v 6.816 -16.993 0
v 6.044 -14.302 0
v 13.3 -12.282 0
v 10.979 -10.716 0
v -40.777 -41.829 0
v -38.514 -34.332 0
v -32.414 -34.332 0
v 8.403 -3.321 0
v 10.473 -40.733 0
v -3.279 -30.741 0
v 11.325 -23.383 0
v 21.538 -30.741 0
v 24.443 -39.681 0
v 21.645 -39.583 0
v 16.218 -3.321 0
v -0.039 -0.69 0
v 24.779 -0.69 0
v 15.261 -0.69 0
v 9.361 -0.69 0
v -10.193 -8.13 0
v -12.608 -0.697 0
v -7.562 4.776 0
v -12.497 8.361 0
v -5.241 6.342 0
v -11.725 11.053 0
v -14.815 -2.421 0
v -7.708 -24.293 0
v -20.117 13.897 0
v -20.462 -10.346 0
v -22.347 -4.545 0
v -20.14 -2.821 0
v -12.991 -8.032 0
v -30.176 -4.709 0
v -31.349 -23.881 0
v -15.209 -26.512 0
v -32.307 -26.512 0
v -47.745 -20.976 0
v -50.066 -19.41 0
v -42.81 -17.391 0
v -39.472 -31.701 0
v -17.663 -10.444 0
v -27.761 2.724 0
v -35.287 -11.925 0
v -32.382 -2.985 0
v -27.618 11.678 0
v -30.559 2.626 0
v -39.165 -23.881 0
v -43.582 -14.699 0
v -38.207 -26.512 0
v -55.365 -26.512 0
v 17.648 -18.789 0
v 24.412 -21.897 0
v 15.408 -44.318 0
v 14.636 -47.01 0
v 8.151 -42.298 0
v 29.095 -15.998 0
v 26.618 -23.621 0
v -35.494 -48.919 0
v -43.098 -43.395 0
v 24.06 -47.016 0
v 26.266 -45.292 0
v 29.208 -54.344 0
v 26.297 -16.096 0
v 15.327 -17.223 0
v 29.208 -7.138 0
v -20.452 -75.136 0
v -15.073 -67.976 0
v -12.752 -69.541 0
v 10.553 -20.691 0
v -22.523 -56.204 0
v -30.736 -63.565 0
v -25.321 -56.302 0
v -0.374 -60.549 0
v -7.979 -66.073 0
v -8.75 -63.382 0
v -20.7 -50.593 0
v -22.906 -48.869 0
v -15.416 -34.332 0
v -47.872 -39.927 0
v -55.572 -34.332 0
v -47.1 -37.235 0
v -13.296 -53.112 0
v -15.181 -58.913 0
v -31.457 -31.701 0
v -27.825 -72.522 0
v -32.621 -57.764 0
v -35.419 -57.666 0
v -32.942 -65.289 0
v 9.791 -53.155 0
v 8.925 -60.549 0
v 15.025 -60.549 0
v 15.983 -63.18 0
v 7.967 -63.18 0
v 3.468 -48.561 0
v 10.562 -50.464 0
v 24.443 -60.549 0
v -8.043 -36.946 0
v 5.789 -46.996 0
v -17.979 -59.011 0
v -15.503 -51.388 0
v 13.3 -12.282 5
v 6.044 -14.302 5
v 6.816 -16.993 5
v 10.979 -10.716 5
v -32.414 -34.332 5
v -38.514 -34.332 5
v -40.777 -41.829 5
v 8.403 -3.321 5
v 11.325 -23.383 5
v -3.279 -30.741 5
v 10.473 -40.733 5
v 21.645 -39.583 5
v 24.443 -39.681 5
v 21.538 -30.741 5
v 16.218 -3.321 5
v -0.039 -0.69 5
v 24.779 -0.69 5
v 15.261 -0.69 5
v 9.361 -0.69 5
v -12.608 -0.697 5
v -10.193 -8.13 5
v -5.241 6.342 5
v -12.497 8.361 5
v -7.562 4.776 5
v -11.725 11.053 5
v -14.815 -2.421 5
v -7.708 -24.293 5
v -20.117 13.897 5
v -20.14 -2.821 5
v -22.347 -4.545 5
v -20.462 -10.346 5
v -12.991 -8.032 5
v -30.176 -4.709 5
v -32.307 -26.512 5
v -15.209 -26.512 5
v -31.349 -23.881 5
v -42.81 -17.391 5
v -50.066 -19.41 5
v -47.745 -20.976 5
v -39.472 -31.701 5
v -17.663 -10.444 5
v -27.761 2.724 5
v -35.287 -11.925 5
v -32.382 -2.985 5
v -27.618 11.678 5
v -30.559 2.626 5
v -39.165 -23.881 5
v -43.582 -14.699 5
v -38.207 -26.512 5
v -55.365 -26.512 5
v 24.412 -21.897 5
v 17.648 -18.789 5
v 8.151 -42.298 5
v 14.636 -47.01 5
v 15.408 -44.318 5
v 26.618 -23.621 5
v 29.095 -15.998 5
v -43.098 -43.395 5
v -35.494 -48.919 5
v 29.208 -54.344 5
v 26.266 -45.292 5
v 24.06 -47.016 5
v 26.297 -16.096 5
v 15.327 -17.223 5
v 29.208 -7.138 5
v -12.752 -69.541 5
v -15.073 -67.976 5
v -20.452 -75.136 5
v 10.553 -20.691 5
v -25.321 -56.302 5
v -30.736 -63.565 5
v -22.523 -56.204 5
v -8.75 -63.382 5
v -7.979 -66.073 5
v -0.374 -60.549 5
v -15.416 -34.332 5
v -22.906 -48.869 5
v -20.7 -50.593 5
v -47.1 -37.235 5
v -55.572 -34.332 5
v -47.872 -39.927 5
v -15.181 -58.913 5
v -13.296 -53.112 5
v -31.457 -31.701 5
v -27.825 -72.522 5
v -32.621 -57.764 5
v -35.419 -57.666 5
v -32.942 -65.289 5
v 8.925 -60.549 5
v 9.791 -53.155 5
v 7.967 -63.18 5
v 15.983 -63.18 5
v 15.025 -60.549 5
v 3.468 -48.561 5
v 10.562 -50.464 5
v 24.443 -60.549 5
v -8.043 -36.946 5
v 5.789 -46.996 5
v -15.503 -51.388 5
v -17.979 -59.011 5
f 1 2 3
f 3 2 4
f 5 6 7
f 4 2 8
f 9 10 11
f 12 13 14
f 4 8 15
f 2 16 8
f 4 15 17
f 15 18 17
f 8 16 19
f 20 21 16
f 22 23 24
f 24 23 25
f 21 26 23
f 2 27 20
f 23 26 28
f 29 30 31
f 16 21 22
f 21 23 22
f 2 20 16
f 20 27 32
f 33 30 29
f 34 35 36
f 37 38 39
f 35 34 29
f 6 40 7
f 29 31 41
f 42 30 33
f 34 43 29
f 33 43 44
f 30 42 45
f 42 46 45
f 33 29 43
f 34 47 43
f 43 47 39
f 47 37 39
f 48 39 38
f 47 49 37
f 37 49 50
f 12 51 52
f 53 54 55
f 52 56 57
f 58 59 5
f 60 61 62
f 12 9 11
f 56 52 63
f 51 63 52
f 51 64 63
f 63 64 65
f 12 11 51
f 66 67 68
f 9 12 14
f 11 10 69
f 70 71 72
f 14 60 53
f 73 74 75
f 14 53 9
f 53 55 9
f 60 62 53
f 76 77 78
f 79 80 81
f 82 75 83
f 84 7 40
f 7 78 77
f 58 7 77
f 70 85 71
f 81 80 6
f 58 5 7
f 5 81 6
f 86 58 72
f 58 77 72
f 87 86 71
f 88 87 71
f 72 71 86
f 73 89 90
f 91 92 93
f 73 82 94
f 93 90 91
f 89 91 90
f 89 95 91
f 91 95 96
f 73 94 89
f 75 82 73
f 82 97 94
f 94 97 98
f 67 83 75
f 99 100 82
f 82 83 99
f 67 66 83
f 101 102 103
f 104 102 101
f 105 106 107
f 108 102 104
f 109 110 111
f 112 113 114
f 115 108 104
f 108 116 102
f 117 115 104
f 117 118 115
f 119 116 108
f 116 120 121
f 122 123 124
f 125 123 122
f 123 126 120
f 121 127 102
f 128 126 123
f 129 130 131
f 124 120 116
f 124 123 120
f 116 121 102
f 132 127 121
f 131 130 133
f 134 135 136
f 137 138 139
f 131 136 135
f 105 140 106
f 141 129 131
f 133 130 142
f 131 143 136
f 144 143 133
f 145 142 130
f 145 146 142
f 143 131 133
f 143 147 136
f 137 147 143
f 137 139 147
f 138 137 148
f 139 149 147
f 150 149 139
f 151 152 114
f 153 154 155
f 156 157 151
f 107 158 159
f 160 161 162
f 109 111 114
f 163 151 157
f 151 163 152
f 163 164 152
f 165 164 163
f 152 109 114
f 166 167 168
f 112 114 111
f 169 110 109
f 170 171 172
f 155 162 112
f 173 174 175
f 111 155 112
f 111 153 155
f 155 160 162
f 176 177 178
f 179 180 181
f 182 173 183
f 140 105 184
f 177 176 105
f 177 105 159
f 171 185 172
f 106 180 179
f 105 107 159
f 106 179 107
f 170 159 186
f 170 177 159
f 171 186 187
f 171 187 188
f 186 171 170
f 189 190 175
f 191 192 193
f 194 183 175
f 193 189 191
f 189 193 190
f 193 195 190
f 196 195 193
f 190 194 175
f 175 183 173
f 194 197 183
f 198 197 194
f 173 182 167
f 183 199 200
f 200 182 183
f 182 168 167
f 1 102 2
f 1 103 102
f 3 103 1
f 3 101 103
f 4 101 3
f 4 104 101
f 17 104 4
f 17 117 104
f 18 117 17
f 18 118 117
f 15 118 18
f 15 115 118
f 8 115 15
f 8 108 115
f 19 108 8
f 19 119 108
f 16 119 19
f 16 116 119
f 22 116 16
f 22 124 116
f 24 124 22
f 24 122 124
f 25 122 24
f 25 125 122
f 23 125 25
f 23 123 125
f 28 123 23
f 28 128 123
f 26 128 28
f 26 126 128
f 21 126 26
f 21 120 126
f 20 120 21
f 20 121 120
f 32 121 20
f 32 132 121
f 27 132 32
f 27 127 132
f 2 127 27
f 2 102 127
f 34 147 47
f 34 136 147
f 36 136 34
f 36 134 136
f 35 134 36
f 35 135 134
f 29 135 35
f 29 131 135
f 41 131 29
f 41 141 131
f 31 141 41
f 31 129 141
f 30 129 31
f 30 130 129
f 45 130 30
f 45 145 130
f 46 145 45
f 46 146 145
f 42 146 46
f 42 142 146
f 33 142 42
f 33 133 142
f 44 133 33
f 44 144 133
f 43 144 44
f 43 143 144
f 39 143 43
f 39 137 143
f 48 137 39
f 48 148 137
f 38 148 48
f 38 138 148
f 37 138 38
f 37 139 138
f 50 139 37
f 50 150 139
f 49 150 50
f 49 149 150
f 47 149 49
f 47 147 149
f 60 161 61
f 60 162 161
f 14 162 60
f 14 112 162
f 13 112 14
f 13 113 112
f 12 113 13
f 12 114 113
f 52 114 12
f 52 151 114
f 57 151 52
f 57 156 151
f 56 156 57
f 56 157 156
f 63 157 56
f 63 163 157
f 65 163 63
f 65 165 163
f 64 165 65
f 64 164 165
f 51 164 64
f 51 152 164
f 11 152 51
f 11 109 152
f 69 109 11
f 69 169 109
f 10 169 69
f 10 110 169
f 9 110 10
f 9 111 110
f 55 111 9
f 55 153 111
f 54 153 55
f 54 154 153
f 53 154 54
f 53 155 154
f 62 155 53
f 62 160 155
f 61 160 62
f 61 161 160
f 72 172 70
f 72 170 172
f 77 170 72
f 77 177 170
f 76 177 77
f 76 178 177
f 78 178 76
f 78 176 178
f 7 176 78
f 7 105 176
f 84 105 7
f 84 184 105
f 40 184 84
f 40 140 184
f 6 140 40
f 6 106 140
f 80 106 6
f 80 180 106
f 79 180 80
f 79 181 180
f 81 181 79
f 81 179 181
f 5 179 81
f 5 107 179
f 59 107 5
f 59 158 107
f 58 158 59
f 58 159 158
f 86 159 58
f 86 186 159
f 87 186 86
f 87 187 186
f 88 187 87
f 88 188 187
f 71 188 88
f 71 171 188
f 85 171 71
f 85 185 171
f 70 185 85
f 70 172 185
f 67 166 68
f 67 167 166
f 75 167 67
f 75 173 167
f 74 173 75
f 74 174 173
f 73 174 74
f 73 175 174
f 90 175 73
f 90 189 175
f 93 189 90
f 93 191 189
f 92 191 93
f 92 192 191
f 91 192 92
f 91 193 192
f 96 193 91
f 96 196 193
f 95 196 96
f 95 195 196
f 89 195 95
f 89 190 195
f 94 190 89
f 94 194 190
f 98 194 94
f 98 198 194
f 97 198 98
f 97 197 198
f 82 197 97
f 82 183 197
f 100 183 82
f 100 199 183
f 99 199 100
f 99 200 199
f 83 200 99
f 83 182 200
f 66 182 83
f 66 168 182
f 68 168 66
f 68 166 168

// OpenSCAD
/* construct Penrose tiling 
  Choose which vertex figure to print
  
   Kit Wallace 2019-03-19
   
*/
// length of the long side of the kite and dart
side = 40;  
// tile inset -ve for outset for laser cutting +ve for 
inset=-0.035;

//  vertex figure 0 to 6 , 7 kite only ,8 dart only
fig=0;
//tab angle
tab_angle=110;
//tab_depth - based on a unit side
tab_depth = 0.07;
//tab_width - based on a unit side
tab_width = 0.15;

// ratio to explore for layout
explode=0.3;
// height for extrusion (0 no extrusion
height=5;


// end of parameters

r1= 2 * cos(72);
p_kite = scale_peri([[r1,144],[r1,72],[1,72],[1,72]],side);
t_kite=peri_to_tile(p_kite);
p_dart = scale_peri([[r1,216],[r1,36],[1,72],[1,36]],side);
t_dart=peri_to_tile(p_dart);
   
function tab(step,parity,a,l,td) =
     let (d=(step[0]-l)/2)
     let (dl=l+td*2*cos(180-a))
     parity ==0 
         ? [[d,180+a],[td,180-a],[dl,180-a],[td,180+a],[d,step[1]]] 
         : [[d,180-a],[td,180+a],[dl,180+a],[td,180-a],[d,step[1]]] ;

function tab_peri(peri,start,a=110,l,td) =
   flatten([for(i=[0:len(peri)-1])
       let(p=peri[i])
       tab(p,(start+i)%2,a,l,td)
    ]);
  

_tab_width=side *tab_width;
_tab_depth=side *tab_depth;

p_tab_kite = tab_peri(p_kite,0,tab_angle,_tab_width,_tab_depth);
t_tab_kite=  peri_to_tile(p_tab_kite);
p_tab_dart=  tab_peri(p_dart,1,tab_angle,_tab_width,_tab_depth);
t_tab_dart=  peri_to_tile(p_tab_dart);
//scale(20) { color("red") fill_tile(t_dart); number_edges(t_dart); translate([1.5,0,0])  { color("green") fill_tile(t_kite);number_edges(t_kite);}}  

colors= ["red","green","blue","pink","yellow","orange"];
tiles= [t_kite,t_dart];
tab_tiles= [t_tab_kite,t_tab_dart];
   
k=0;d=1;

pairings = 
    [[[k,2],[k,3]],[[k,0],[k,1]],[[d,2],[d,3]],[[k,0],[d,0]],[[k,1],[d,1]],[[k,2],[d,2]],[[k,3],[d,3]]];

//should be able to compute these allowable assemblies of tiles given the pairings but not yet done
assemblies = [
    [[[d,0]],[[d,2],[0,3]],[[d,2],[1,3]],[[d,2],[2,3]],[[d,2],[3,3]]],
    [[[k,0]],[[k,2],[0,3]],[[d,0],[0,0]]],
    [[[k,0]],[[k,2],[0,3]],[[k,2],[1,3]],[[k,2],[2,3]],[[k,2],[3,3]]],
    [[[d,0]],[[d,2],[0,3]],[[d,2],[1,3]],[[k,3],[2,3]],[[k,2],[0,2]]],
    [[[k,0]],[[k,1],[0,0]],[[d,0],[1,0]],[[d,1],[0,1]]],
    [[[k,0]],[[k,1],[0,0]],[[d,2],[1,2]],[[k,3],[2,3]],[[k,2],[0,3]]],
    [[[k,0]],[[d,1],[0,1]],[[k,2],[1,2]],[[k,2],[2,3]],[[d,0],[0,0]]],
    [[[k,0]]],
    [[[d,0]]]
   
];

b_transforms = group_transforms(tiles,assemblies[fig]);
// u_base = apply_group_transforms(tiles,b_transforms);
u_tab = apply_group_transforms(tab_tiles,b_transforms);
if (height>0)
    linear_extrude(height=height)
      fill_tiles(explode_tiles(inset_group(u_tab,inset),explode),colors);
else 
       fill_tiles(explode_tiles(inset_group(u_tab,inset),explode),colors);

// extracts from tiling library
module fill_tiles (tiles,colors=["lightgreen"]) {
    for (i=[0:len(tiles)-1]) {
       colors = colors[i % len(colors)];
       fill_tile(tiles[i],colors); 
    }
}
module fill_tile(tile,col="red") {
    color(col)
       polygon(3d_to_2d(tile)); 
};
 // functions

function explode_tiles(tiles,factor) =
   [for (t=tiles)  
     let (c = v_centre(t))
     let (d = c*factor)
     translate_tile(t,d)
   ]
  ;

function inset_group(g,d)=
   [for (t=g)  inset_tile(t,d)];
  
// create list of transformations 
// apply the transformations

function group_transforms(tiles,assembly,group=[],transforms=[],i=0) =
    i==len(assembly)
        ? transforms
        : let(move = assembly[i])
          let(source = move[0])
          let(source_i=source[0])
          let(source_side=len(source)==2 ? source[1] :0)
          let(mirror = len(source)==3 ? 1 : 0)
          let(source_tile = mirror==1 ? mirror_tile(tiles[source_i]) : tiles[source_i] )
          len(move) ==1
             ? let (m = m_edge_to_edge(edge(source_tile,0),edge(source_tile,source_side)))
               let (nt = copy_tile(source_tile,m))
               let (t= [source_i,m,mirror])            
               group_transforms(tiles,assembly,concat(group,[nt]),concat(transforms,[t]),i+1)
             : let (dest = move[1])
               let (dest_i=dest[0])
               let (dest_tile=group[dest_i])
               let (dest_side=dest[1])
               let (end = len(dest)==3 ? 1 : 0)
               let (m = m_edge_to_edge(edge(source_tile,source_side),edge(dest_tile,dest_side,end)))
               let (nt = copy_tile(source_tile,m))
               let (t= [source_i,m,mirror])
               group_transforms(tiles,assembly,concat(group,[nt]),concat(transforms,[t]),i+1);

function apply_group_transforms(tiles,transforms,group=[],i=0) =
     i==len(transforms)
        ? group
        : let (transform = transforms[i])
          let (source_tile=tiles[transform[0]])
          let (m=transform[1])
          let (mirror = transform[2])
          let(nt = 
                   mirror
                       ?  copy_tile(mirror_tile(source_tile,m))
                       :  copy_tile(source_tile,m)
                       )
          apply_group_transforms(tiles,transforms,concat(group,[nt]),i+1);

function m_edge_to_edge(edge1, edge2,end=0) =
  // need to 
    let (start = (end==0 || end== undef) ? 1 : 0)
    let (a = angle_between(  
                edge2[1] - edge2[0],
                edge1[0] - edge1[1]))
    let (t1 = m_translate(-edge1[start]))
    let (r =  m_rotate([0,0,-a]))
    let (t2 = m_translate(edge2[end])) 
    t1*r*t2;

function copy_tile(tile,m) =
    [for (p = tile) transform(p,m)];


function m_translate(v) = [ [1, 0, 0, 0],
                            [0, 1, 0, 0],
                            [0, 0, 1, 0],
                            [v.x, v.y, v.z, 1  ] ];
                            
function m_rotate(v) =  [ [1,  0,         0,        0],
                          [0,  cos(v.x),  sin(v.x), 0],
                          [0, -sin(v.x),  cos(v.x), 0],
                          [0,  0,         0,        1] ]
                      * [ [ cos(v.y), 0,  -sin(v.y), 0],
                          [0,         1,  0,        0],
                          [ sin(v.y), 0,  cos(v.y), 0],
                          [0,         0,  0,        1] ]
                      * [ [ cos(v.z),  sin(v.z), 0, 0],
                          [-sin(v.z),  cos(v.z), 0, 0],
                          [ 0,         0,        1, 0],
                          [ 0,         0,        0, 1] ];
 
function m_scale(v,s) =
     depth(v)==2
      	? [ [v[0],0,0,0],
	        [0,v[1],0,0],
	        [0,0,v[2],0],
	        [0,0,0,1]
          ]
        : [ [v,0,0,0],
	        [0,v,0,0],
	        [0,0,v,0],
	        [0,0,0,1]
          ];
          
function vec3(v) = [v.x, v.y, v.z];
function transform(v, m)  = vec3([v.x, v.y, v.z, 1] * m);

function edge(points,i) =
   [points[i],points[(i +1) %len(points)]];

function replace_sides(peri,sides) =
 flatten( [for (i=[0:len(peri)-1])
      let (bside = peri[i])
      let (mside =  sides[i % len(sides)])
      let (mside_m = 
              len(mside) >1 
                 ? concat([for (i=[0:len(mside)-2]) mside[i]],[[mside[len(mside)-1][0],bside[1]]])
                 : [[mside[0][0],bside[1]]]
           )
      let (mside_length = peri_error(mside_m))
      let (mside_scaled = scale_peri(mside_m,bside[0]/mside_length))
      mside_scaled
  ]);

function peri_to_points(peri,pos=[0,0,0],dir=0,i=0) =
    i == len(peri)
      ? [pos]
      : let (side = peri[i])
        let (distance = side[0])
        let (newpos = pos + distance* [cos(dir), sin(dir),0])
        let (angle = side[1])
        let (newdir = dir + (180 - angle))
        concat([pos],peri_to_points(peri,newpos,newdir,i+1)) 
     ;                 

function peri_to_tile(peri,last=false) = 
    let (p = peri_to_points(norm_peri(peri)))  
    last 
       ? [for (i=[0:len(p)-1]) p[i]] 
       : [for (i=[0:len(p)-2]) p[i]]; 

function norm_peri(peri) =
     [for (p=peri)
        len(p)==undef
           ? [1,p]
           :[p.x,p.y] 
     ];
function repeat_peri(p,n) =
   norm_peri( flatten([for (i=[0:n-1]) p]));
    
function scale_peri(peri,scale) =
   [for (p=peri)
        len(p)==undef
           ? [scale,p]
           :[scale * p[0],p[1]] 
   ];
   
function peri_error(peri) = 
    norm(peri_end(peri));

function peri_end(peri) =
    let(t=peri_to_tile(peri,true))
    t[len(t)-1];    
  
function translate_tile(t,d) =
      [for (p=t) p+d]; 
        
function centre_tile(t) =
    let(c = v_avg(t))
    translate_tile(t,-c);

function inset_tile (tile, d=0.1) =
  [for (i=[0:len(tile)-1])
      let (v1 = unitv(tile[(i+len(tile) - 1 )% len(tile)] - tile[i]))
      let (v2 = unitv(tile[i] - tile[(i+1 )% len(tile)] ))
      let (vm = unitv((v1 - v2) /2))
      let (a = 180 - angle_between(v1,v2))
      let (offset = d / sin(a/2))
      tile[i]+offset * vm
  ];
  
 function angle_between(u, v) = 
     let (x= unitv(u) * unitv(v))
     let (y = x <= -1 ? -1 :x >= 1 ? 1 : x)
     let (a = acos(y))
     let (d = cross(u,v).z)
      d  > 0 ? a : 360- a;
  
function unitv(v)=  
   let (n = norm(v))
   n !=0 ? v/ norm(v) : v;
  
function 3d_to_2d(points)=
    [ for (p=points) [p.x,p.y]];
function v_avg(v) =v_sum(v) / len(v);
      
function zero(v) =
    len(v) == undef ? 0 : [for (i=[0:len(v)-1]) 0];
        
function v_sum_r(v,n,k) =
      k < n ?  v[k] + v_sum_r(v,n,k+1) : zero(v[0]) ;

function v_sum(v) = v_sum_r(v,len(v),0);
      
function flatten(l) = [ for (a = l) for (b = a) b ] ;
    
function v_centre(v) =  v_sum(v) / len(v);
